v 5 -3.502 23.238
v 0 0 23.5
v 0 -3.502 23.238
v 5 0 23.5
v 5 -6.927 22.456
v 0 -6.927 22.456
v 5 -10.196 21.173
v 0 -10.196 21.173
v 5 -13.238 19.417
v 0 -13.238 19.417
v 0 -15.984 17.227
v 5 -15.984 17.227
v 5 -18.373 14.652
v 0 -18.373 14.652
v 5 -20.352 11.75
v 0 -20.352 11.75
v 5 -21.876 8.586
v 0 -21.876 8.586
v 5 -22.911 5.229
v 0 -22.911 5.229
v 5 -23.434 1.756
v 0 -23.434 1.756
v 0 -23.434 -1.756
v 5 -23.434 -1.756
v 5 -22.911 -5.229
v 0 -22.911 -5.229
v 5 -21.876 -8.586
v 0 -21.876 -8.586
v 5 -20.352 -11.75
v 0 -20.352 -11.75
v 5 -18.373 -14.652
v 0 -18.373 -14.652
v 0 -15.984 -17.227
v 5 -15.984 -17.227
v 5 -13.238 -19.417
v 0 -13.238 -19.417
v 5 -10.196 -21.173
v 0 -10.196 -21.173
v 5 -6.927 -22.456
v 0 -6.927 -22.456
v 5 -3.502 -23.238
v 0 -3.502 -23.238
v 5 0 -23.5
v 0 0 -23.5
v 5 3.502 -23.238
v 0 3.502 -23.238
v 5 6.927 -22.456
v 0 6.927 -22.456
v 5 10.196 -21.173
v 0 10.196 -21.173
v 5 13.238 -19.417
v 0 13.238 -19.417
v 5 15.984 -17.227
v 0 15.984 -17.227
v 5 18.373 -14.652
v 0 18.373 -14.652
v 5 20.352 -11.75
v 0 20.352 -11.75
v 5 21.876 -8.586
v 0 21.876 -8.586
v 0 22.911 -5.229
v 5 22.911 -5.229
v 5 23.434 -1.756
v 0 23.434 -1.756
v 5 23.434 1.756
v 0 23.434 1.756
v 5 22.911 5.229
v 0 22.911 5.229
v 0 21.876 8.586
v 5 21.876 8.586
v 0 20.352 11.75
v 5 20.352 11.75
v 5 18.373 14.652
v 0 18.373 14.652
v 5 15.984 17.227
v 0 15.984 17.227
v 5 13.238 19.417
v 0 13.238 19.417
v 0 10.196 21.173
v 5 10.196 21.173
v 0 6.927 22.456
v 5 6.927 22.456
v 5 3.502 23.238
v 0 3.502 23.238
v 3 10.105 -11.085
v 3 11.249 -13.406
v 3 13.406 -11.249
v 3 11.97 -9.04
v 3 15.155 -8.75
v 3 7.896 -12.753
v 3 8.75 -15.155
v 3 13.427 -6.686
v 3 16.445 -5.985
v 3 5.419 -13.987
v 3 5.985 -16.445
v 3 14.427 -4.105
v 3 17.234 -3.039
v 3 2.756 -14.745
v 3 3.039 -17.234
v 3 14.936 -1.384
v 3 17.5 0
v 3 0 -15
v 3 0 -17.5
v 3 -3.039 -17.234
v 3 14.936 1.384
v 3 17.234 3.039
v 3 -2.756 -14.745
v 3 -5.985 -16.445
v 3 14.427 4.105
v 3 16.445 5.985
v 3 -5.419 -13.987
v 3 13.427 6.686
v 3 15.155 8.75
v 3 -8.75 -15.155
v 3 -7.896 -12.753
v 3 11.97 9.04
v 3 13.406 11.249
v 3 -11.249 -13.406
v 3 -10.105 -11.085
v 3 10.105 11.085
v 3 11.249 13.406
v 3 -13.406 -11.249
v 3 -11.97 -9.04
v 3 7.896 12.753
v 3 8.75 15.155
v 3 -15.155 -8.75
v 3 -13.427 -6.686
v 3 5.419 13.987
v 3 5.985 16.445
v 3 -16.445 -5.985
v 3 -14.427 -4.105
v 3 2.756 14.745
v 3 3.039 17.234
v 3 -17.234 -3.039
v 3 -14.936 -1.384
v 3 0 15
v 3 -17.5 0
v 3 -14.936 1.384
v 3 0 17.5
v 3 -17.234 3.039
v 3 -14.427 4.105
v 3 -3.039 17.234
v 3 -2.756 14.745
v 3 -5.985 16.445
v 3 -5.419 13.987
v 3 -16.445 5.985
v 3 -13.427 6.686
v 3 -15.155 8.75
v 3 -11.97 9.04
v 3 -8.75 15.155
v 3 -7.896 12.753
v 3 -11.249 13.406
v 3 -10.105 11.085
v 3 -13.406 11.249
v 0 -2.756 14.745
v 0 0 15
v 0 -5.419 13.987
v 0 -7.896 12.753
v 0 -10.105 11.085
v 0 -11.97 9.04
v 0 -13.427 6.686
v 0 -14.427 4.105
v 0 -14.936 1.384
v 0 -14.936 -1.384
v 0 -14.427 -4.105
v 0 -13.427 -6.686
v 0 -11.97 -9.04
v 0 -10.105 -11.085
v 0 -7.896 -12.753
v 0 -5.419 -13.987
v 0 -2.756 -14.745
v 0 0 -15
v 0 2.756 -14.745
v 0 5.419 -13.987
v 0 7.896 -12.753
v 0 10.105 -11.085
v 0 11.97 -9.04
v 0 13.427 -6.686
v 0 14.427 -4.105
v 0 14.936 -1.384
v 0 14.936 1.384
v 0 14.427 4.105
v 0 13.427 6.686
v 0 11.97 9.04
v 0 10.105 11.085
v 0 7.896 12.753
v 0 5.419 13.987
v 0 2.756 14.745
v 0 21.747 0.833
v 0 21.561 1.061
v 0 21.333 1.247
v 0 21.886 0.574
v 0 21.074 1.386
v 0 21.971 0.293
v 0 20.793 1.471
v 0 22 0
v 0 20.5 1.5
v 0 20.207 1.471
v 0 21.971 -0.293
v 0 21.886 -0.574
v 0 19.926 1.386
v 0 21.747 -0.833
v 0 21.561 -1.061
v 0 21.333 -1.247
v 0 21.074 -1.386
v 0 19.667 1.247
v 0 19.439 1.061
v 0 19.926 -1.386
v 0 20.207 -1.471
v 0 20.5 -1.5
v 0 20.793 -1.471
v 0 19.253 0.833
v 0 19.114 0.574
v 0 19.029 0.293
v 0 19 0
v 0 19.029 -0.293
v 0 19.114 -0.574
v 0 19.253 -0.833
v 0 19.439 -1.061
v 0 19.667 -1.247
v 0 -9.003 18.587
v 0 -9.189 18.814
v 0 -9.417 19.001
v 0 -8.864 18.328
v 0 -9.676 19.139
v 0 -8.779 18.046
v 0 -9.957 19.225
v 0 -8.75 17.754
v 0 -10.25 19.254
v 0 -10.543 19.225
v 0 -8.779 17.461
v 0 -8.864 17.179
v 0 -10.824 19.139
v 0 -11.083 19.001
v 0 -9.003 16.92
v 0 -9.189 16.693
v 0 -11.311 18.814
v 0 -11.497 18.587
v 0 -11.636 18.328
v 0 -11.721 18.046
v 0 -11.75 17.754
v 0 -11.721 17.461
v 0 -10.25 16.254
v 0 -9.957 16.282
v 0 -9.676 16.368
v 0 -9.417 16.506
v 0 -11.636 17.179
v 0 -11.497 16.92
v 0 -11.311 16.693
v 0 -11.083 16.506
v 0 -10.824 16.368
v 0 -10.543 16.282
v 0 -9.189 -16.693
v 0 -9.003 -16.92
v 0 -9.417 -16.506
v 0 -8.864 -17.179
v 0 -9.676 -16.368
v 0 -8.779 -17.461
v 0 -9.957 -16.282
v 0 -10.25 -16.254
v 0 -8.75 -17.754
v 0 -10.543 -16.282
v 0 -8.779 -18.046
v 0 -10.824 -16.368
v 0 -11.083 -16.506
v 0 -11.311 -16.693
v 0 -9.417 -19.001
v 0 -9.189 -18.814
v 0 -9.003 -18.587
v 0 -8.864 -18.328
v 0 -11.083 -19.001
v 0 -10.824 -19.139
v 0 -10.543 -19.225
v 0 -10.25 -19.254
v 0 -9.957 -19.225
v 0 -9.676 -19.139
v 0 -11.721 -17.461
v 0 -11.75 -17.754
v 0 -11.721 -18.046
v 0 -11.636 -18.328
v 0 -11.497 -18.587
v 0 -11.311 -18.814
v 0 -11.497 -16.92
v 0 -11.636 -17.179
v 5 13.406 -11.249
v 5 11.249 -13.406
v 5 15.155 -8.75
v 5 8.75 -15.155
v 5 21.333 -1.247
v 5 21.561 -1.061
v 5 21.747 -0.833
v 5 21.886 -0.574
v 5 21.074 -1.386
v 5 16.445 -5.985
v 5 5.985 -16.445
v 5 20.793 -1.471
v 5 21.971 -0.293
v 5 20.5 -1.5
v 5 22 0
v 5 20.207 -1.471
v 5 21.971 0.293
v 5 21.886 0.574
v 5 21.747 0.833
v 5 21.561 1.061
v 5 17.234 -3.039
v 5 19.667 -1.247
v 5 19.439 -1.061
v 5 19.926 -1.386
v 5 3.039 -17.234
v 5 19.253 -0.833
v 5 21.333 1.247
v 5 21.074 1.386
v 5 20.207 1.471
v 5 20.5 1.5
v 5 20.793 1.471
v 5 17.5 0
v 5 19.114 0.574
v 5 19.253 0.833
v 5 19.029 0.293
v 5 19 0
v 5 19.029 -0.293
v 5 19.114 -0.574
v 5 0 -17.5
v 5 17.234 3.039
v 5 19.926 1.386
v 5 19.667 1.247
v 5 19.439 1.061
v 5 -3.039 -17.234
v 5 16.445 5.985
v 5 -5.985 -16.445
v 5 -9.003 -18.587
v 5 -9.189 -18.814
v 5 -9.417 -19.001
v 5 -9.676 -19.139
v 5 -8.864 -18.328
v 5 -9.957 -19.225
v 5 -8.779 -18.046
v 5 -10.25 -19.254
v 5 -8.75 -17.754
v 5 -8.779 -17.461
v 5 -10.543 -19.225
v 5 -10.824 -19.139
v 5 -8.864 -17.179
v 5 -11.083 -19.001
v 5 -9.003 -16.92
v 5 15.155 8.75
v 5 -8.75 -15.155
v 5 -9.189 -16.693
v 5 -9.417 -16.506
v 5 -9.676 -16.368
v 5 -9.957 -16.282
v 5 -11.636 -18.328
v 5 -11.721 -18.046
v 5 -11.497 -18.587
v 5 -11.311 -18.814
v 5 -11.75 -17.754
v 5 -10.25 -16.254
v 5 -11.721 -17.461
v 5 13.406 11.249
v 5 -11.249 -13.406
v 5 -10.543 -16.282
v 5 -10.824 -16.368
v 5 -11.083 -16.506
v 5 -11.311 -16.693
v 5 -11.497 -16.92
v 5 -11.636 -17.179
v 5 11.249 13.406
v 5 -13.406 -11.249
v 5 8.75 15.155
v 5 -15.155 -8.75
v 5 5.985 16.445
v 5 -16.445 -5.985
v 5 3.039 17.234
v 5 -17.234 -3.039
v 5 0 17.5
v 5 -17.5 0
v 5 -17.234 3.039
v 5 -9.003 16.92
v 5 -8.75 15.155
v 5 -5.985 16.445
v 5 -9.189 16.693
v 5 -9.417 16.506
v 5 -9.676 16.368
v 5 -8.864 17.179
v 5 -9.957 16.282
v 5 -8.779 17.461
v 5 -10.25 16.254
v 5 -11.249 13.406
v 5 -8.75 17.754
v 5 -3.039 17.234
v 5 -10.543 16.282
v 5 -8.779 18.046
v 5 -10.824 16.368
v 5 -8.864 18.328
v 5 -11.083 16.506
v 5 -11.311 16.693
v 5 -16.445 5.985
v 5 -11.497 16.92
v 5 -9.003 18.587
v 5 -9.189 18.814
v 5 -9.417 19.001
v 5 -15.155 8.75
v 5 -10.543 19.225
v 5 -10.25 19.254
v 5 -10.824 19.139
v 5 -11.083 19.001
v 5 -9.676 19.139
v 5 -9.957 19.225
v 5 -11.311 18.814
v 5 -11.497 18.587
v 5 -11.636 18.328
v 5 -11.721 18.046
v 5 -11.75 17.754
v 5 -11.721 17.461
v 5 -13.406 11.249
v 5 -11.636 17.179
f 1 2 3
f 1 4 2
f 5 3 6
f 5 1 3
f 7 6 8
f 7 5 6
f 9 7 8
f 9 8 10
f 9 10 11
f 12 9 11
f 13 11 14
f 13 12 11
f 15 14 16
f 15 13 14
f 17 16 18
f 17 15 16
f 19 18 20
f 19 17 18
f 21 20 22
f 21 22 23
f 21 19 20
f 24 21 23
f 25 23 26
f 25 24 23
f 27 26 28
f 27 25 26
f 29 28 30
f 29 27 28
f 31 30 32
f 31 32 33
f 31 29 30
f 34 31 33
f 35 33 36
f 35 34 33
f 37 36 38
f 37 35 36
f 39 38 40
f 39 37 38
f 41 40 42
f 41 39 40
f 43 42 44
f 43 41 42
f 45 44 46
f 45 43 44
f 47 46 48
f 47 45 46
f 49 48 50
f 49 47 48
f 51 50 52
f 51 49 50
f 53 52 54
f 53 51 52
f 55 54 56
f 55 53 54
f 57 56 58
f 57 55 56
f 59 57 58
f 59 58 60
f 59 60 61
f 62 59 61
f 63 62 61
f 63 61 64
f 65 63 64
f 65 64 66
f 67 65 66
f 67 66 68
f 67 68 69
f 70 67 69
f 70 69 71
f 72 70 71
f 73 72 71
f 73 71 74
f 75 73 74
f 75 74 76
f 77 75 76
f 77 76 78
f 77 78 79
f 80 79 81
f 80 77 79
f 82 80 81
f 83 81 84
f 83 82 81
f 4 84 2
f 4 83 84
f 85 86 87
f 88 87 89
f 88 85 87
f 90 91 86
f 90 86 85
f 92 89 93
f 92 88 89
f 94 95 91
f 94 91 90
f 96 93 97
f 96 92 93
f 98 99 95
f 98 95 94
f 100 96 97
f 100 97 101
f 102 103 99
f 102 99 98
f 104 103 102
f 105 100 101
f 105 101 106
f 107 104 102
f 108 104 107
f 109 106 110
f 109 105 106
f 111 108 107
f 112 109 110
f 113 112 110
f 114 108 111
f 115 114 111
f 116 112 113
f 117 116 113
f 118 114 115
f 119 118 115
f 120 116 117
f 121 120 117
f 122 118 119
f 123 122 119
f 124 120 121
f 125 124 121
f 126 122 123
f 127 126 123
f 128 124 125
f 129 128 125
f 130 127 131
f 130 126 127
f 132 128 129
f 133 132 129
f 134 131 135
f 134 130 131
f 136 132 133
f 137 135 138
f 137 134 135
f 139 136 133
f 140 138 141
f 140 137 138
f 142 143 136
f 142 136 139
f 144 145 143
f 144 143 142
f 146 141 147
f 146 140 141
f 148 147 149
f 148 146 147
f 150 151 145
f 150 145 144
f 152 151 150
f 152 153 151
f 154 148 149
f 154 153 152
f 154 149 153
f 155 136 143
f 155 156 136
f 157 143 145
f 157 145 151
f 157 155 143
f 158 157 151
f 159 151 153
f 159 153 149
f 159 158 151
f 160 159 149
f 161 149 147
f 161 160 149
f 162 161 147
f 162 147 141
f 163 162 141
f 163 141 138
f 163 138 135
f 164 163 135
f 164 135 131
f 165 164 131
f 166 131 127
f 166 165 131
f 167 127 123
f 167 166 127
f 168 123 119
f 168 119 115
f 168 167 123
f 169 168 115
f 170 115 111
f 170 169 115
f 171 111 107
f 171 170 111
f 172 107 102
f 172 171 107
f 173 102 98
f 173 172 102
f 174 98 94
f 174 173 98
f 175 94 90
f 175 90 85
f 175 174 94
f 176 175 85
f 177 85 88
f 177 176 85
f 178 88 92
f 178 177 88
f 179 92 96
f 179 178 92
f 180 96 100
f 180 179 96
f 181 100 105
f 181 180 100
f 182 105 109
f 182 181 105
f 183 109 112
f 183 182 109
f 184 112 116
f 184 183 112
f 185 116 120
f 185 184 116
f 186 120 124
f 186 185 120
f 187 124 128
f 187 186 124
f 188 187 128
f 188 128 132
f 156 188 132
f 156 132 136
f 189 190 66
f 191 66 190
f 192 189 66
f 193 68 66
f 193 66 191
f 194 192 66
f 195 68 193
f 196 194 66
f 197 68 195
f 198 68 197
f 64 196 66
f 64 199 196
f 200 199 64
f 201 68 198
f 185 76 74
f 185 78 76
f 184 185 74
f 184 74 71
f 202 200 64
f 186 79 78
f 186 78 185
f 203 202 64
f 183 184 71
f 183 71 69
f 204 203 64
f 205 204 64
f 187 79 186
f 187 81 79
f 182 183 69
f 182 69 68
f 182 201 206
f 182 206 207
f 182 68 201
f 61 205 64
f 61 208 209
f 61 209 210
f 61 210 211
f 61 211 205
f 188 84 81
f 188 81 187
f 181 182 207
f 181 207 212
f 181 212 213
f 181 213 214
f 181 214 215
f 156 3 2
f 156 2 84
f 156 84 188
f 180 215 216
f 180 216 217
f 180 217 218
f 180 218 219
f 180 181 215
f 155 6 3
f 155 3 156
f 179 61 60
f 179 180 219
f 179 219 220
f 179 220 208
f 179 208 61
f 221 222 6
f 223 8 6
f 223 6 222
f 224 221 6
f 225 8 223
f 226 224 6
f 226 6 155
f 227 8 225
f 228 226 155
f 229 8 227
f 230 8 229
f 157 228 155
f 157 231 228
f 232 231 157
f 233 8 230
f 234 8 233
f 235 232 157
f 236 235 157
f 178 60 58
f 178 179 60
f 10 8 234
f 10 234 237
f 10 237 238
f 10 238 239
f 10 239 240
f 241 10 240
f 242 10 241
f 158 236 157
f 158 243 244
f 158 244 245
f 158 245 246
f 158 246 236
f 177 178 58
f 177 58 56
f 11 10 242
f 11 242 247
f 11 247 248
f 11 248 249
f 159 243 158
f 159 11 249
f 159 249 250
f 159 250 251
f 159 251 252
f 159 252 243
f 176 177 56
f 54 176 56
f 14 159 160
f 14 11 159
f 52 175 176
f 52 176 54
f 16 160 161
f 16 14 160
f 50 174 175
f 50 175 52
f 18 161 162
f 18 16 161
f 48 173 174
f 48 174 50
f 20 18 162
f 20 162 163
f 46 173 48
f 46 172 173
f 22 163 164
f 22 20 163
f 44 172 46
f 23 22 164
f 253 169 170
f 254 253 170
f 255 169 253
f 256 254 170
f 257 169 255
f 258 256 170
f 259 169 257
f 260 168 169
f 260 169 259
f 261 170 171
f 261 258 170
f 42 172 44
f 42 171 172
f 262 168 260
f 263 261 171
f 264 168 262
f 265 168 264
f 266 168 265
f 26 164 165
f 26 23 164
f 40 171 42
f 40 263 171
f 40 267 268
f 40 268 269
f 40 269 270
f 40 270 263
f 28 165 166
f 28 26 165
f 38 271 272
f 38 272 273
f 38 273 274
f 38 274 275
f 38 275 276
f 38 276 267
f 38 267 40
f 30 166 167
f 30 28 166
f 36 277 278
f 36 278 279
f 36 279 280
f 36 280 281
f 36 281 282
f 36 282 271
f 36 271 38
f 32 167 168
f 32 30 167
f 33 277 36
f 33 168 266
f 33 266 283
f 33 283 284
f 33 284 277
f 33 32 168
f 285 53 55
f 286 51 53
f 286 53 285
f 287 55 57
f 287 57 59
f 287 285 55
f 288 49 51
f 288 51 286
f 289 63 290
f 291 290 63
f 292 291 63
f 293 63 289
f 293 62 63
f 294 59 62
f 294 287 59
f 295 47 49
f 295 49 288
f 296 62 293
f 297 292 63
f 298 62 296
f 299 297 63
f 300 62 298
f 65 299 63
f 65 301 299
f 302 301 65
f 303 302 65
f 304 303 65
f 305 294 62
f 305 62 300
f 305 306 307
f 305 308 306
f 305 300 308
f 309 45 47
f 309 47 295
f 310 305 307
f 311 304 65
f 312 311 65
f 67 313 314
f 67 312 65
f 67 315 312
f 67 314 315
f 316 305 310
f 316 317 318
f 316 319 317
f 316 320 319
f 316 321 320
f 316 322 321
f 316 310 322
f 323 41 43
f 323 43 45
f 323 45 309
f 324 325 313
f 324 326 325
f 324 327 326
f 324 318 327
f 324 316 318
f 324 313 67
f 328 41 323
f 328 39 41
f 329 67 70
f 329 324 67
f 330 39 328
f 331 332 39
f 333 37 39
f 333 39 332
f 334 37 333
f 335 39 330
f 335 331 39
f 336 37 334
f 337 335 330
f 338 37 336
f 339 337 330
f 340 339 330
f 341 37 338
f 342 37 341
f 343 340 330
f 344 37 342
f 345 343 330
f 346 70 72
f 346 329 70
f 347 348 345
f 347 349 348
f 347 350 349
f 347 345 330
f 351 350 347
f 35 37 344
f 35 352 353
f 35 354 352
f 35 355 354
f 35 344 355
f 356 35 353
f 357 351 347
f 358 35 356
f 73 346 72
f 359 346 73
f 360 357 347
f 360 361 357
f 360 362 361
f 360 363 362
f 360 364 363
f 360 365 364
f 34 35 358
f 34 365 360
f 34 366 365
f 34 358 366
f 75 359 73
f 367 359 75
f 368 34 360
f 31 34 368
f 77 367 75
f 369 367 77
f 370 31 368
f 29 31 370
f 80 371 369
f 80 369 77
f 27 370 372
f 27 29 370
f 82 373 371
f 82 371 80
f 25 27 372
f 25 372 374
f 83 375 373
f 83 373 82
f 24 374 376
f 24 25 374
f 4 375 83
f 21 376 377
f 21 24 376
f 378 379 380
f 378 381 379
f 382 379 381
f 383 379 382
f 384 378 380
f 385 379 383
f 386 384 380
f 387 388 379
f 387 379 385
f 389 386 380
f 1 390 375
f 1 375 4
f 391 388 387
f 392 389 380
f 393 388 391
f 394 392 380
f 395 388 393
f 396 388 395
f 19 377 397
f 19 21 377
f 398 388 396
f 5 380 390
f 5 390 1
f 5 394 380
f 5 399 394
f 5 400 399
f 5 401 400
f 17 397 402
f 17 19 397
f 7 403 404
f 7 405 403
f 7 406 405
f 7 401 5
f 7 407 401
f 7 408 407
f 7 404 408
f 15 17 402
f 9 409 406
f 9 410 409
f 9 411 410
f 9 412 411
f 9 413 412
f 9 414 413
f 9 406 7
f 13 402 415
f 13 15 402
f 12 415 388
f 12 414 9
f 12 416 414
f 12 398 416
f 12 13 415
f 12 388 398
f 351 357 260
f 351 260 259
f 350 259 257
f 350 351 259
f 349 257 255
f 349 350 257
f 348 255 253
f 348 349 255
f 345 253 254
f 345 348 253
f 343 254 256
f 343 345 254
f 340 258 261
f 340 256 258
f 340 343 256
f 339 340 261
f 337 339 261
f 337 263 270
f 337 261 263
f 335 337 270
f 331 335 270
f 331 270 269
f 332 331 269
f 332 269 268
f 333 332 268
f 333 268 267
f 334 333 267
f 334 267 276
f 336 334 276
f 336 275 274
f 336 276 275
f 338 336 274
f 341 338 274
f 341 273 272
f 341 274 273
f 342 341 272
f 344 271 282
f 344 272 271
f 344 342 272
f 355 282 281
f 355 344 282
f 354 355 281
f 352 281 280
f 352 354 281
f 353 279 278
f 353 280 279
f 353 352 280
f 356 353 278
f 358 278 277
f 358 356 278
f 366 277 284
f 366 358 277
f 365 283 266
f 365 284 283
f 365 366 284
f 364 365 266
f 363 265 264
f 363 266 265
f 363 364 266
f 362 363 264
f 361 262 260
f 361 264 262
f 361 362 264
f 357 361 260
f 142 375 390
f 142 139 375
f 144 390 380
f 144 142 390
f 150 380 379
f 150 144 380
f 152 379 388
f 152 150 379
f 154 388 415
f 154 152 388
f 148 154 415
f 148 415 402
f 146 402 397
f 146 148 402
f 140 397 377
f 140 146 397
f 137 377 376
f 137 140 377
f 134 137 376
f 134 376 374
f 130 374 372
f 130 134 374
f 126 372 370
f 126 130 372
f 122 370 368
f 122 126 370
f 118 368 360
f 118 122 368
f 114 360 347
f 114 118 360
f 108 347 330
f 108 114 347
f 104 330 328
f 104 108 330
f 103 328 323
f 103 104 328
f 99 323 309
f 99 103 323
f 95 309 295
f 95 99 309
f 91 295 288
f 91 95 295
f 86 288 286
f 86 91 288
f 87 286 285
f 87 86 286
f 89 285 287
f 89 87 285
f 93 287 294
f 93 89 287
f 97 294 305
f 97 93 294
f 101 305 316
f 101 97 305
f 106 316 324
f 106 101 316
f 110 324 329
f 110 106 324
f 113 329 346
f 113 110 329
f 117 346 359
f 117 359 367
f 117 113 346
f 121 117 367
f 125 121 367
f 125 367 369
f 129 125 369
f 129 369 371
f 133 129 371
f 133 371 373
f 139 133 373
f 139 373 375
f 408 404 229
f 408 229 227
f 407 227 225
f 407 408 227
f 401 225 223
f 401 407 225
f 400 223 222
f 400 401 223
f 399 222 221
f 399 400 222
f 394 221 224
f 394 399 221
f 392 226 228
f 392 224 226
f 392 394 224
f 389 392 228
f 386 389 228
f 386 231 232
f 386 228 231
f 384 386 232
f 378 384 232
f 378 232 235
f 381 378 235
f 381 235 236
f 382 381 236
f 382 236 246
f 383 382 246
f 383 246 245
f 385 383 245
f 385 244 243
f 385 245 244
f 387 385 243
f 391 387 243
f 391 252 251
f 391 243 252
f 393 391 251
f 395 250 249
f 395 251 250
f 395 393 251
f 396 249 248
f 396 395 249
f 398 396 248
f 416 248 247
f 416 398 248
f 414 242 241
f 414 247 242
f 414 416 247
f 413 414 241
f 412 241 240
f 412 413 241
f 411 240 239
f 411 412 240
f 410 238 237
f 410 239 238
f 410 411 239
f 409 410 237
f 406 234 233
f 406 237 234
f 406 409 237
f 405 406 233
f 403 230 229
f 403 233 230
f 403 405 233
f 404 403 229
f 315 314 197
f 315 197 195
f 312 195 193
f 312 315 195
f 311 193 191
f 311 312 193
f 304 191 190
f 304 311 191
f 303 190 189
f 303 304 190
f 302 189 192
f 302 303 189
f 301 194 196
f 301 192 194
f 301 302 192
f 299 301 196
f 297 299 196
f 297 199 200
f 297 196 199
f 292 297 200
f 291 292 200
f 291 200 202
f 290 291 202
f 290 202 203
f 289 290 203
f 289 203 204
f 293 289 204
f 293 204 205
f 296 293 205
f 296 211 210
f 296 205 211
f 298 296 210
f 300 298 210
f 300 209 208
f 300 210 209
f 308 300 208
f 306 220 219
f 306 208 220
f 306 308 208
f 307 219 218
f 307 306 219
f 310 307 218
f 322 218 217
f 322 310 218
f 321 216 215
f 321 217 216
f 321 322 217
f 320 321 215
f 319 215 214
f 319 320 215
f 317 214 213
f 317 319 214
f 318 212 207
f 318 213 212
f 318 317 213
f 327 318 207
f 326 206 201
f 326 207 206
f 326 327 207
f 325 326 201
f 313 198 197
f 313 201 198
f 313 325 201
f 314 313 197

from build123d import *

# Parameters (mm, degrees)
CUT_EXTRUDE1_DEPTH      = 34.608034754
CUT_EXTRUDE1_DEPTH_BACK = 34.608034754
SKETCH2_R               = 1.5


with BuildPart() as part:
    # Sketch1 → Revolve1 (revolve)
    with BuildSketch(Plane.XY, mode=Mode.PRIVATE) as revolve1_sk:
        Polygon((0, 15), (0, 23.5), (5, 23.5), (5, 17.5), (3, 17.5), (3, 15), align=None)
    revolve(revolve1_sk.sketch.rotate(Axis((0, 0, 0), (1, 0, 0)), 90), axis=Axis((0, 0, 0), (1, 0, 0)))

    # Sketch2 → Cut-Extrude1 (cut, two sides: drawn at the far end of the back side and taken through both)
    with BuildSketch(Plane.ZY.offset(-CUT_EXTRUDE1_DEPTH_BACK)):
        with Locations((0, 20.5)):
            Circle(SKETCH2_R)
        with Locations((17.753520778, -10.25)):
            Circle(SKETCH2_R)
        with Locations((-17.753520778, -10.25)):
            Circle(SKETCH2_R)
    extrude(amount=CUT_EXTRUDE1_DEPTH + CUT_EXTRUDE1_DEPTH_BACK, mode=Mode.SUBTRACT)


solid = part.part
